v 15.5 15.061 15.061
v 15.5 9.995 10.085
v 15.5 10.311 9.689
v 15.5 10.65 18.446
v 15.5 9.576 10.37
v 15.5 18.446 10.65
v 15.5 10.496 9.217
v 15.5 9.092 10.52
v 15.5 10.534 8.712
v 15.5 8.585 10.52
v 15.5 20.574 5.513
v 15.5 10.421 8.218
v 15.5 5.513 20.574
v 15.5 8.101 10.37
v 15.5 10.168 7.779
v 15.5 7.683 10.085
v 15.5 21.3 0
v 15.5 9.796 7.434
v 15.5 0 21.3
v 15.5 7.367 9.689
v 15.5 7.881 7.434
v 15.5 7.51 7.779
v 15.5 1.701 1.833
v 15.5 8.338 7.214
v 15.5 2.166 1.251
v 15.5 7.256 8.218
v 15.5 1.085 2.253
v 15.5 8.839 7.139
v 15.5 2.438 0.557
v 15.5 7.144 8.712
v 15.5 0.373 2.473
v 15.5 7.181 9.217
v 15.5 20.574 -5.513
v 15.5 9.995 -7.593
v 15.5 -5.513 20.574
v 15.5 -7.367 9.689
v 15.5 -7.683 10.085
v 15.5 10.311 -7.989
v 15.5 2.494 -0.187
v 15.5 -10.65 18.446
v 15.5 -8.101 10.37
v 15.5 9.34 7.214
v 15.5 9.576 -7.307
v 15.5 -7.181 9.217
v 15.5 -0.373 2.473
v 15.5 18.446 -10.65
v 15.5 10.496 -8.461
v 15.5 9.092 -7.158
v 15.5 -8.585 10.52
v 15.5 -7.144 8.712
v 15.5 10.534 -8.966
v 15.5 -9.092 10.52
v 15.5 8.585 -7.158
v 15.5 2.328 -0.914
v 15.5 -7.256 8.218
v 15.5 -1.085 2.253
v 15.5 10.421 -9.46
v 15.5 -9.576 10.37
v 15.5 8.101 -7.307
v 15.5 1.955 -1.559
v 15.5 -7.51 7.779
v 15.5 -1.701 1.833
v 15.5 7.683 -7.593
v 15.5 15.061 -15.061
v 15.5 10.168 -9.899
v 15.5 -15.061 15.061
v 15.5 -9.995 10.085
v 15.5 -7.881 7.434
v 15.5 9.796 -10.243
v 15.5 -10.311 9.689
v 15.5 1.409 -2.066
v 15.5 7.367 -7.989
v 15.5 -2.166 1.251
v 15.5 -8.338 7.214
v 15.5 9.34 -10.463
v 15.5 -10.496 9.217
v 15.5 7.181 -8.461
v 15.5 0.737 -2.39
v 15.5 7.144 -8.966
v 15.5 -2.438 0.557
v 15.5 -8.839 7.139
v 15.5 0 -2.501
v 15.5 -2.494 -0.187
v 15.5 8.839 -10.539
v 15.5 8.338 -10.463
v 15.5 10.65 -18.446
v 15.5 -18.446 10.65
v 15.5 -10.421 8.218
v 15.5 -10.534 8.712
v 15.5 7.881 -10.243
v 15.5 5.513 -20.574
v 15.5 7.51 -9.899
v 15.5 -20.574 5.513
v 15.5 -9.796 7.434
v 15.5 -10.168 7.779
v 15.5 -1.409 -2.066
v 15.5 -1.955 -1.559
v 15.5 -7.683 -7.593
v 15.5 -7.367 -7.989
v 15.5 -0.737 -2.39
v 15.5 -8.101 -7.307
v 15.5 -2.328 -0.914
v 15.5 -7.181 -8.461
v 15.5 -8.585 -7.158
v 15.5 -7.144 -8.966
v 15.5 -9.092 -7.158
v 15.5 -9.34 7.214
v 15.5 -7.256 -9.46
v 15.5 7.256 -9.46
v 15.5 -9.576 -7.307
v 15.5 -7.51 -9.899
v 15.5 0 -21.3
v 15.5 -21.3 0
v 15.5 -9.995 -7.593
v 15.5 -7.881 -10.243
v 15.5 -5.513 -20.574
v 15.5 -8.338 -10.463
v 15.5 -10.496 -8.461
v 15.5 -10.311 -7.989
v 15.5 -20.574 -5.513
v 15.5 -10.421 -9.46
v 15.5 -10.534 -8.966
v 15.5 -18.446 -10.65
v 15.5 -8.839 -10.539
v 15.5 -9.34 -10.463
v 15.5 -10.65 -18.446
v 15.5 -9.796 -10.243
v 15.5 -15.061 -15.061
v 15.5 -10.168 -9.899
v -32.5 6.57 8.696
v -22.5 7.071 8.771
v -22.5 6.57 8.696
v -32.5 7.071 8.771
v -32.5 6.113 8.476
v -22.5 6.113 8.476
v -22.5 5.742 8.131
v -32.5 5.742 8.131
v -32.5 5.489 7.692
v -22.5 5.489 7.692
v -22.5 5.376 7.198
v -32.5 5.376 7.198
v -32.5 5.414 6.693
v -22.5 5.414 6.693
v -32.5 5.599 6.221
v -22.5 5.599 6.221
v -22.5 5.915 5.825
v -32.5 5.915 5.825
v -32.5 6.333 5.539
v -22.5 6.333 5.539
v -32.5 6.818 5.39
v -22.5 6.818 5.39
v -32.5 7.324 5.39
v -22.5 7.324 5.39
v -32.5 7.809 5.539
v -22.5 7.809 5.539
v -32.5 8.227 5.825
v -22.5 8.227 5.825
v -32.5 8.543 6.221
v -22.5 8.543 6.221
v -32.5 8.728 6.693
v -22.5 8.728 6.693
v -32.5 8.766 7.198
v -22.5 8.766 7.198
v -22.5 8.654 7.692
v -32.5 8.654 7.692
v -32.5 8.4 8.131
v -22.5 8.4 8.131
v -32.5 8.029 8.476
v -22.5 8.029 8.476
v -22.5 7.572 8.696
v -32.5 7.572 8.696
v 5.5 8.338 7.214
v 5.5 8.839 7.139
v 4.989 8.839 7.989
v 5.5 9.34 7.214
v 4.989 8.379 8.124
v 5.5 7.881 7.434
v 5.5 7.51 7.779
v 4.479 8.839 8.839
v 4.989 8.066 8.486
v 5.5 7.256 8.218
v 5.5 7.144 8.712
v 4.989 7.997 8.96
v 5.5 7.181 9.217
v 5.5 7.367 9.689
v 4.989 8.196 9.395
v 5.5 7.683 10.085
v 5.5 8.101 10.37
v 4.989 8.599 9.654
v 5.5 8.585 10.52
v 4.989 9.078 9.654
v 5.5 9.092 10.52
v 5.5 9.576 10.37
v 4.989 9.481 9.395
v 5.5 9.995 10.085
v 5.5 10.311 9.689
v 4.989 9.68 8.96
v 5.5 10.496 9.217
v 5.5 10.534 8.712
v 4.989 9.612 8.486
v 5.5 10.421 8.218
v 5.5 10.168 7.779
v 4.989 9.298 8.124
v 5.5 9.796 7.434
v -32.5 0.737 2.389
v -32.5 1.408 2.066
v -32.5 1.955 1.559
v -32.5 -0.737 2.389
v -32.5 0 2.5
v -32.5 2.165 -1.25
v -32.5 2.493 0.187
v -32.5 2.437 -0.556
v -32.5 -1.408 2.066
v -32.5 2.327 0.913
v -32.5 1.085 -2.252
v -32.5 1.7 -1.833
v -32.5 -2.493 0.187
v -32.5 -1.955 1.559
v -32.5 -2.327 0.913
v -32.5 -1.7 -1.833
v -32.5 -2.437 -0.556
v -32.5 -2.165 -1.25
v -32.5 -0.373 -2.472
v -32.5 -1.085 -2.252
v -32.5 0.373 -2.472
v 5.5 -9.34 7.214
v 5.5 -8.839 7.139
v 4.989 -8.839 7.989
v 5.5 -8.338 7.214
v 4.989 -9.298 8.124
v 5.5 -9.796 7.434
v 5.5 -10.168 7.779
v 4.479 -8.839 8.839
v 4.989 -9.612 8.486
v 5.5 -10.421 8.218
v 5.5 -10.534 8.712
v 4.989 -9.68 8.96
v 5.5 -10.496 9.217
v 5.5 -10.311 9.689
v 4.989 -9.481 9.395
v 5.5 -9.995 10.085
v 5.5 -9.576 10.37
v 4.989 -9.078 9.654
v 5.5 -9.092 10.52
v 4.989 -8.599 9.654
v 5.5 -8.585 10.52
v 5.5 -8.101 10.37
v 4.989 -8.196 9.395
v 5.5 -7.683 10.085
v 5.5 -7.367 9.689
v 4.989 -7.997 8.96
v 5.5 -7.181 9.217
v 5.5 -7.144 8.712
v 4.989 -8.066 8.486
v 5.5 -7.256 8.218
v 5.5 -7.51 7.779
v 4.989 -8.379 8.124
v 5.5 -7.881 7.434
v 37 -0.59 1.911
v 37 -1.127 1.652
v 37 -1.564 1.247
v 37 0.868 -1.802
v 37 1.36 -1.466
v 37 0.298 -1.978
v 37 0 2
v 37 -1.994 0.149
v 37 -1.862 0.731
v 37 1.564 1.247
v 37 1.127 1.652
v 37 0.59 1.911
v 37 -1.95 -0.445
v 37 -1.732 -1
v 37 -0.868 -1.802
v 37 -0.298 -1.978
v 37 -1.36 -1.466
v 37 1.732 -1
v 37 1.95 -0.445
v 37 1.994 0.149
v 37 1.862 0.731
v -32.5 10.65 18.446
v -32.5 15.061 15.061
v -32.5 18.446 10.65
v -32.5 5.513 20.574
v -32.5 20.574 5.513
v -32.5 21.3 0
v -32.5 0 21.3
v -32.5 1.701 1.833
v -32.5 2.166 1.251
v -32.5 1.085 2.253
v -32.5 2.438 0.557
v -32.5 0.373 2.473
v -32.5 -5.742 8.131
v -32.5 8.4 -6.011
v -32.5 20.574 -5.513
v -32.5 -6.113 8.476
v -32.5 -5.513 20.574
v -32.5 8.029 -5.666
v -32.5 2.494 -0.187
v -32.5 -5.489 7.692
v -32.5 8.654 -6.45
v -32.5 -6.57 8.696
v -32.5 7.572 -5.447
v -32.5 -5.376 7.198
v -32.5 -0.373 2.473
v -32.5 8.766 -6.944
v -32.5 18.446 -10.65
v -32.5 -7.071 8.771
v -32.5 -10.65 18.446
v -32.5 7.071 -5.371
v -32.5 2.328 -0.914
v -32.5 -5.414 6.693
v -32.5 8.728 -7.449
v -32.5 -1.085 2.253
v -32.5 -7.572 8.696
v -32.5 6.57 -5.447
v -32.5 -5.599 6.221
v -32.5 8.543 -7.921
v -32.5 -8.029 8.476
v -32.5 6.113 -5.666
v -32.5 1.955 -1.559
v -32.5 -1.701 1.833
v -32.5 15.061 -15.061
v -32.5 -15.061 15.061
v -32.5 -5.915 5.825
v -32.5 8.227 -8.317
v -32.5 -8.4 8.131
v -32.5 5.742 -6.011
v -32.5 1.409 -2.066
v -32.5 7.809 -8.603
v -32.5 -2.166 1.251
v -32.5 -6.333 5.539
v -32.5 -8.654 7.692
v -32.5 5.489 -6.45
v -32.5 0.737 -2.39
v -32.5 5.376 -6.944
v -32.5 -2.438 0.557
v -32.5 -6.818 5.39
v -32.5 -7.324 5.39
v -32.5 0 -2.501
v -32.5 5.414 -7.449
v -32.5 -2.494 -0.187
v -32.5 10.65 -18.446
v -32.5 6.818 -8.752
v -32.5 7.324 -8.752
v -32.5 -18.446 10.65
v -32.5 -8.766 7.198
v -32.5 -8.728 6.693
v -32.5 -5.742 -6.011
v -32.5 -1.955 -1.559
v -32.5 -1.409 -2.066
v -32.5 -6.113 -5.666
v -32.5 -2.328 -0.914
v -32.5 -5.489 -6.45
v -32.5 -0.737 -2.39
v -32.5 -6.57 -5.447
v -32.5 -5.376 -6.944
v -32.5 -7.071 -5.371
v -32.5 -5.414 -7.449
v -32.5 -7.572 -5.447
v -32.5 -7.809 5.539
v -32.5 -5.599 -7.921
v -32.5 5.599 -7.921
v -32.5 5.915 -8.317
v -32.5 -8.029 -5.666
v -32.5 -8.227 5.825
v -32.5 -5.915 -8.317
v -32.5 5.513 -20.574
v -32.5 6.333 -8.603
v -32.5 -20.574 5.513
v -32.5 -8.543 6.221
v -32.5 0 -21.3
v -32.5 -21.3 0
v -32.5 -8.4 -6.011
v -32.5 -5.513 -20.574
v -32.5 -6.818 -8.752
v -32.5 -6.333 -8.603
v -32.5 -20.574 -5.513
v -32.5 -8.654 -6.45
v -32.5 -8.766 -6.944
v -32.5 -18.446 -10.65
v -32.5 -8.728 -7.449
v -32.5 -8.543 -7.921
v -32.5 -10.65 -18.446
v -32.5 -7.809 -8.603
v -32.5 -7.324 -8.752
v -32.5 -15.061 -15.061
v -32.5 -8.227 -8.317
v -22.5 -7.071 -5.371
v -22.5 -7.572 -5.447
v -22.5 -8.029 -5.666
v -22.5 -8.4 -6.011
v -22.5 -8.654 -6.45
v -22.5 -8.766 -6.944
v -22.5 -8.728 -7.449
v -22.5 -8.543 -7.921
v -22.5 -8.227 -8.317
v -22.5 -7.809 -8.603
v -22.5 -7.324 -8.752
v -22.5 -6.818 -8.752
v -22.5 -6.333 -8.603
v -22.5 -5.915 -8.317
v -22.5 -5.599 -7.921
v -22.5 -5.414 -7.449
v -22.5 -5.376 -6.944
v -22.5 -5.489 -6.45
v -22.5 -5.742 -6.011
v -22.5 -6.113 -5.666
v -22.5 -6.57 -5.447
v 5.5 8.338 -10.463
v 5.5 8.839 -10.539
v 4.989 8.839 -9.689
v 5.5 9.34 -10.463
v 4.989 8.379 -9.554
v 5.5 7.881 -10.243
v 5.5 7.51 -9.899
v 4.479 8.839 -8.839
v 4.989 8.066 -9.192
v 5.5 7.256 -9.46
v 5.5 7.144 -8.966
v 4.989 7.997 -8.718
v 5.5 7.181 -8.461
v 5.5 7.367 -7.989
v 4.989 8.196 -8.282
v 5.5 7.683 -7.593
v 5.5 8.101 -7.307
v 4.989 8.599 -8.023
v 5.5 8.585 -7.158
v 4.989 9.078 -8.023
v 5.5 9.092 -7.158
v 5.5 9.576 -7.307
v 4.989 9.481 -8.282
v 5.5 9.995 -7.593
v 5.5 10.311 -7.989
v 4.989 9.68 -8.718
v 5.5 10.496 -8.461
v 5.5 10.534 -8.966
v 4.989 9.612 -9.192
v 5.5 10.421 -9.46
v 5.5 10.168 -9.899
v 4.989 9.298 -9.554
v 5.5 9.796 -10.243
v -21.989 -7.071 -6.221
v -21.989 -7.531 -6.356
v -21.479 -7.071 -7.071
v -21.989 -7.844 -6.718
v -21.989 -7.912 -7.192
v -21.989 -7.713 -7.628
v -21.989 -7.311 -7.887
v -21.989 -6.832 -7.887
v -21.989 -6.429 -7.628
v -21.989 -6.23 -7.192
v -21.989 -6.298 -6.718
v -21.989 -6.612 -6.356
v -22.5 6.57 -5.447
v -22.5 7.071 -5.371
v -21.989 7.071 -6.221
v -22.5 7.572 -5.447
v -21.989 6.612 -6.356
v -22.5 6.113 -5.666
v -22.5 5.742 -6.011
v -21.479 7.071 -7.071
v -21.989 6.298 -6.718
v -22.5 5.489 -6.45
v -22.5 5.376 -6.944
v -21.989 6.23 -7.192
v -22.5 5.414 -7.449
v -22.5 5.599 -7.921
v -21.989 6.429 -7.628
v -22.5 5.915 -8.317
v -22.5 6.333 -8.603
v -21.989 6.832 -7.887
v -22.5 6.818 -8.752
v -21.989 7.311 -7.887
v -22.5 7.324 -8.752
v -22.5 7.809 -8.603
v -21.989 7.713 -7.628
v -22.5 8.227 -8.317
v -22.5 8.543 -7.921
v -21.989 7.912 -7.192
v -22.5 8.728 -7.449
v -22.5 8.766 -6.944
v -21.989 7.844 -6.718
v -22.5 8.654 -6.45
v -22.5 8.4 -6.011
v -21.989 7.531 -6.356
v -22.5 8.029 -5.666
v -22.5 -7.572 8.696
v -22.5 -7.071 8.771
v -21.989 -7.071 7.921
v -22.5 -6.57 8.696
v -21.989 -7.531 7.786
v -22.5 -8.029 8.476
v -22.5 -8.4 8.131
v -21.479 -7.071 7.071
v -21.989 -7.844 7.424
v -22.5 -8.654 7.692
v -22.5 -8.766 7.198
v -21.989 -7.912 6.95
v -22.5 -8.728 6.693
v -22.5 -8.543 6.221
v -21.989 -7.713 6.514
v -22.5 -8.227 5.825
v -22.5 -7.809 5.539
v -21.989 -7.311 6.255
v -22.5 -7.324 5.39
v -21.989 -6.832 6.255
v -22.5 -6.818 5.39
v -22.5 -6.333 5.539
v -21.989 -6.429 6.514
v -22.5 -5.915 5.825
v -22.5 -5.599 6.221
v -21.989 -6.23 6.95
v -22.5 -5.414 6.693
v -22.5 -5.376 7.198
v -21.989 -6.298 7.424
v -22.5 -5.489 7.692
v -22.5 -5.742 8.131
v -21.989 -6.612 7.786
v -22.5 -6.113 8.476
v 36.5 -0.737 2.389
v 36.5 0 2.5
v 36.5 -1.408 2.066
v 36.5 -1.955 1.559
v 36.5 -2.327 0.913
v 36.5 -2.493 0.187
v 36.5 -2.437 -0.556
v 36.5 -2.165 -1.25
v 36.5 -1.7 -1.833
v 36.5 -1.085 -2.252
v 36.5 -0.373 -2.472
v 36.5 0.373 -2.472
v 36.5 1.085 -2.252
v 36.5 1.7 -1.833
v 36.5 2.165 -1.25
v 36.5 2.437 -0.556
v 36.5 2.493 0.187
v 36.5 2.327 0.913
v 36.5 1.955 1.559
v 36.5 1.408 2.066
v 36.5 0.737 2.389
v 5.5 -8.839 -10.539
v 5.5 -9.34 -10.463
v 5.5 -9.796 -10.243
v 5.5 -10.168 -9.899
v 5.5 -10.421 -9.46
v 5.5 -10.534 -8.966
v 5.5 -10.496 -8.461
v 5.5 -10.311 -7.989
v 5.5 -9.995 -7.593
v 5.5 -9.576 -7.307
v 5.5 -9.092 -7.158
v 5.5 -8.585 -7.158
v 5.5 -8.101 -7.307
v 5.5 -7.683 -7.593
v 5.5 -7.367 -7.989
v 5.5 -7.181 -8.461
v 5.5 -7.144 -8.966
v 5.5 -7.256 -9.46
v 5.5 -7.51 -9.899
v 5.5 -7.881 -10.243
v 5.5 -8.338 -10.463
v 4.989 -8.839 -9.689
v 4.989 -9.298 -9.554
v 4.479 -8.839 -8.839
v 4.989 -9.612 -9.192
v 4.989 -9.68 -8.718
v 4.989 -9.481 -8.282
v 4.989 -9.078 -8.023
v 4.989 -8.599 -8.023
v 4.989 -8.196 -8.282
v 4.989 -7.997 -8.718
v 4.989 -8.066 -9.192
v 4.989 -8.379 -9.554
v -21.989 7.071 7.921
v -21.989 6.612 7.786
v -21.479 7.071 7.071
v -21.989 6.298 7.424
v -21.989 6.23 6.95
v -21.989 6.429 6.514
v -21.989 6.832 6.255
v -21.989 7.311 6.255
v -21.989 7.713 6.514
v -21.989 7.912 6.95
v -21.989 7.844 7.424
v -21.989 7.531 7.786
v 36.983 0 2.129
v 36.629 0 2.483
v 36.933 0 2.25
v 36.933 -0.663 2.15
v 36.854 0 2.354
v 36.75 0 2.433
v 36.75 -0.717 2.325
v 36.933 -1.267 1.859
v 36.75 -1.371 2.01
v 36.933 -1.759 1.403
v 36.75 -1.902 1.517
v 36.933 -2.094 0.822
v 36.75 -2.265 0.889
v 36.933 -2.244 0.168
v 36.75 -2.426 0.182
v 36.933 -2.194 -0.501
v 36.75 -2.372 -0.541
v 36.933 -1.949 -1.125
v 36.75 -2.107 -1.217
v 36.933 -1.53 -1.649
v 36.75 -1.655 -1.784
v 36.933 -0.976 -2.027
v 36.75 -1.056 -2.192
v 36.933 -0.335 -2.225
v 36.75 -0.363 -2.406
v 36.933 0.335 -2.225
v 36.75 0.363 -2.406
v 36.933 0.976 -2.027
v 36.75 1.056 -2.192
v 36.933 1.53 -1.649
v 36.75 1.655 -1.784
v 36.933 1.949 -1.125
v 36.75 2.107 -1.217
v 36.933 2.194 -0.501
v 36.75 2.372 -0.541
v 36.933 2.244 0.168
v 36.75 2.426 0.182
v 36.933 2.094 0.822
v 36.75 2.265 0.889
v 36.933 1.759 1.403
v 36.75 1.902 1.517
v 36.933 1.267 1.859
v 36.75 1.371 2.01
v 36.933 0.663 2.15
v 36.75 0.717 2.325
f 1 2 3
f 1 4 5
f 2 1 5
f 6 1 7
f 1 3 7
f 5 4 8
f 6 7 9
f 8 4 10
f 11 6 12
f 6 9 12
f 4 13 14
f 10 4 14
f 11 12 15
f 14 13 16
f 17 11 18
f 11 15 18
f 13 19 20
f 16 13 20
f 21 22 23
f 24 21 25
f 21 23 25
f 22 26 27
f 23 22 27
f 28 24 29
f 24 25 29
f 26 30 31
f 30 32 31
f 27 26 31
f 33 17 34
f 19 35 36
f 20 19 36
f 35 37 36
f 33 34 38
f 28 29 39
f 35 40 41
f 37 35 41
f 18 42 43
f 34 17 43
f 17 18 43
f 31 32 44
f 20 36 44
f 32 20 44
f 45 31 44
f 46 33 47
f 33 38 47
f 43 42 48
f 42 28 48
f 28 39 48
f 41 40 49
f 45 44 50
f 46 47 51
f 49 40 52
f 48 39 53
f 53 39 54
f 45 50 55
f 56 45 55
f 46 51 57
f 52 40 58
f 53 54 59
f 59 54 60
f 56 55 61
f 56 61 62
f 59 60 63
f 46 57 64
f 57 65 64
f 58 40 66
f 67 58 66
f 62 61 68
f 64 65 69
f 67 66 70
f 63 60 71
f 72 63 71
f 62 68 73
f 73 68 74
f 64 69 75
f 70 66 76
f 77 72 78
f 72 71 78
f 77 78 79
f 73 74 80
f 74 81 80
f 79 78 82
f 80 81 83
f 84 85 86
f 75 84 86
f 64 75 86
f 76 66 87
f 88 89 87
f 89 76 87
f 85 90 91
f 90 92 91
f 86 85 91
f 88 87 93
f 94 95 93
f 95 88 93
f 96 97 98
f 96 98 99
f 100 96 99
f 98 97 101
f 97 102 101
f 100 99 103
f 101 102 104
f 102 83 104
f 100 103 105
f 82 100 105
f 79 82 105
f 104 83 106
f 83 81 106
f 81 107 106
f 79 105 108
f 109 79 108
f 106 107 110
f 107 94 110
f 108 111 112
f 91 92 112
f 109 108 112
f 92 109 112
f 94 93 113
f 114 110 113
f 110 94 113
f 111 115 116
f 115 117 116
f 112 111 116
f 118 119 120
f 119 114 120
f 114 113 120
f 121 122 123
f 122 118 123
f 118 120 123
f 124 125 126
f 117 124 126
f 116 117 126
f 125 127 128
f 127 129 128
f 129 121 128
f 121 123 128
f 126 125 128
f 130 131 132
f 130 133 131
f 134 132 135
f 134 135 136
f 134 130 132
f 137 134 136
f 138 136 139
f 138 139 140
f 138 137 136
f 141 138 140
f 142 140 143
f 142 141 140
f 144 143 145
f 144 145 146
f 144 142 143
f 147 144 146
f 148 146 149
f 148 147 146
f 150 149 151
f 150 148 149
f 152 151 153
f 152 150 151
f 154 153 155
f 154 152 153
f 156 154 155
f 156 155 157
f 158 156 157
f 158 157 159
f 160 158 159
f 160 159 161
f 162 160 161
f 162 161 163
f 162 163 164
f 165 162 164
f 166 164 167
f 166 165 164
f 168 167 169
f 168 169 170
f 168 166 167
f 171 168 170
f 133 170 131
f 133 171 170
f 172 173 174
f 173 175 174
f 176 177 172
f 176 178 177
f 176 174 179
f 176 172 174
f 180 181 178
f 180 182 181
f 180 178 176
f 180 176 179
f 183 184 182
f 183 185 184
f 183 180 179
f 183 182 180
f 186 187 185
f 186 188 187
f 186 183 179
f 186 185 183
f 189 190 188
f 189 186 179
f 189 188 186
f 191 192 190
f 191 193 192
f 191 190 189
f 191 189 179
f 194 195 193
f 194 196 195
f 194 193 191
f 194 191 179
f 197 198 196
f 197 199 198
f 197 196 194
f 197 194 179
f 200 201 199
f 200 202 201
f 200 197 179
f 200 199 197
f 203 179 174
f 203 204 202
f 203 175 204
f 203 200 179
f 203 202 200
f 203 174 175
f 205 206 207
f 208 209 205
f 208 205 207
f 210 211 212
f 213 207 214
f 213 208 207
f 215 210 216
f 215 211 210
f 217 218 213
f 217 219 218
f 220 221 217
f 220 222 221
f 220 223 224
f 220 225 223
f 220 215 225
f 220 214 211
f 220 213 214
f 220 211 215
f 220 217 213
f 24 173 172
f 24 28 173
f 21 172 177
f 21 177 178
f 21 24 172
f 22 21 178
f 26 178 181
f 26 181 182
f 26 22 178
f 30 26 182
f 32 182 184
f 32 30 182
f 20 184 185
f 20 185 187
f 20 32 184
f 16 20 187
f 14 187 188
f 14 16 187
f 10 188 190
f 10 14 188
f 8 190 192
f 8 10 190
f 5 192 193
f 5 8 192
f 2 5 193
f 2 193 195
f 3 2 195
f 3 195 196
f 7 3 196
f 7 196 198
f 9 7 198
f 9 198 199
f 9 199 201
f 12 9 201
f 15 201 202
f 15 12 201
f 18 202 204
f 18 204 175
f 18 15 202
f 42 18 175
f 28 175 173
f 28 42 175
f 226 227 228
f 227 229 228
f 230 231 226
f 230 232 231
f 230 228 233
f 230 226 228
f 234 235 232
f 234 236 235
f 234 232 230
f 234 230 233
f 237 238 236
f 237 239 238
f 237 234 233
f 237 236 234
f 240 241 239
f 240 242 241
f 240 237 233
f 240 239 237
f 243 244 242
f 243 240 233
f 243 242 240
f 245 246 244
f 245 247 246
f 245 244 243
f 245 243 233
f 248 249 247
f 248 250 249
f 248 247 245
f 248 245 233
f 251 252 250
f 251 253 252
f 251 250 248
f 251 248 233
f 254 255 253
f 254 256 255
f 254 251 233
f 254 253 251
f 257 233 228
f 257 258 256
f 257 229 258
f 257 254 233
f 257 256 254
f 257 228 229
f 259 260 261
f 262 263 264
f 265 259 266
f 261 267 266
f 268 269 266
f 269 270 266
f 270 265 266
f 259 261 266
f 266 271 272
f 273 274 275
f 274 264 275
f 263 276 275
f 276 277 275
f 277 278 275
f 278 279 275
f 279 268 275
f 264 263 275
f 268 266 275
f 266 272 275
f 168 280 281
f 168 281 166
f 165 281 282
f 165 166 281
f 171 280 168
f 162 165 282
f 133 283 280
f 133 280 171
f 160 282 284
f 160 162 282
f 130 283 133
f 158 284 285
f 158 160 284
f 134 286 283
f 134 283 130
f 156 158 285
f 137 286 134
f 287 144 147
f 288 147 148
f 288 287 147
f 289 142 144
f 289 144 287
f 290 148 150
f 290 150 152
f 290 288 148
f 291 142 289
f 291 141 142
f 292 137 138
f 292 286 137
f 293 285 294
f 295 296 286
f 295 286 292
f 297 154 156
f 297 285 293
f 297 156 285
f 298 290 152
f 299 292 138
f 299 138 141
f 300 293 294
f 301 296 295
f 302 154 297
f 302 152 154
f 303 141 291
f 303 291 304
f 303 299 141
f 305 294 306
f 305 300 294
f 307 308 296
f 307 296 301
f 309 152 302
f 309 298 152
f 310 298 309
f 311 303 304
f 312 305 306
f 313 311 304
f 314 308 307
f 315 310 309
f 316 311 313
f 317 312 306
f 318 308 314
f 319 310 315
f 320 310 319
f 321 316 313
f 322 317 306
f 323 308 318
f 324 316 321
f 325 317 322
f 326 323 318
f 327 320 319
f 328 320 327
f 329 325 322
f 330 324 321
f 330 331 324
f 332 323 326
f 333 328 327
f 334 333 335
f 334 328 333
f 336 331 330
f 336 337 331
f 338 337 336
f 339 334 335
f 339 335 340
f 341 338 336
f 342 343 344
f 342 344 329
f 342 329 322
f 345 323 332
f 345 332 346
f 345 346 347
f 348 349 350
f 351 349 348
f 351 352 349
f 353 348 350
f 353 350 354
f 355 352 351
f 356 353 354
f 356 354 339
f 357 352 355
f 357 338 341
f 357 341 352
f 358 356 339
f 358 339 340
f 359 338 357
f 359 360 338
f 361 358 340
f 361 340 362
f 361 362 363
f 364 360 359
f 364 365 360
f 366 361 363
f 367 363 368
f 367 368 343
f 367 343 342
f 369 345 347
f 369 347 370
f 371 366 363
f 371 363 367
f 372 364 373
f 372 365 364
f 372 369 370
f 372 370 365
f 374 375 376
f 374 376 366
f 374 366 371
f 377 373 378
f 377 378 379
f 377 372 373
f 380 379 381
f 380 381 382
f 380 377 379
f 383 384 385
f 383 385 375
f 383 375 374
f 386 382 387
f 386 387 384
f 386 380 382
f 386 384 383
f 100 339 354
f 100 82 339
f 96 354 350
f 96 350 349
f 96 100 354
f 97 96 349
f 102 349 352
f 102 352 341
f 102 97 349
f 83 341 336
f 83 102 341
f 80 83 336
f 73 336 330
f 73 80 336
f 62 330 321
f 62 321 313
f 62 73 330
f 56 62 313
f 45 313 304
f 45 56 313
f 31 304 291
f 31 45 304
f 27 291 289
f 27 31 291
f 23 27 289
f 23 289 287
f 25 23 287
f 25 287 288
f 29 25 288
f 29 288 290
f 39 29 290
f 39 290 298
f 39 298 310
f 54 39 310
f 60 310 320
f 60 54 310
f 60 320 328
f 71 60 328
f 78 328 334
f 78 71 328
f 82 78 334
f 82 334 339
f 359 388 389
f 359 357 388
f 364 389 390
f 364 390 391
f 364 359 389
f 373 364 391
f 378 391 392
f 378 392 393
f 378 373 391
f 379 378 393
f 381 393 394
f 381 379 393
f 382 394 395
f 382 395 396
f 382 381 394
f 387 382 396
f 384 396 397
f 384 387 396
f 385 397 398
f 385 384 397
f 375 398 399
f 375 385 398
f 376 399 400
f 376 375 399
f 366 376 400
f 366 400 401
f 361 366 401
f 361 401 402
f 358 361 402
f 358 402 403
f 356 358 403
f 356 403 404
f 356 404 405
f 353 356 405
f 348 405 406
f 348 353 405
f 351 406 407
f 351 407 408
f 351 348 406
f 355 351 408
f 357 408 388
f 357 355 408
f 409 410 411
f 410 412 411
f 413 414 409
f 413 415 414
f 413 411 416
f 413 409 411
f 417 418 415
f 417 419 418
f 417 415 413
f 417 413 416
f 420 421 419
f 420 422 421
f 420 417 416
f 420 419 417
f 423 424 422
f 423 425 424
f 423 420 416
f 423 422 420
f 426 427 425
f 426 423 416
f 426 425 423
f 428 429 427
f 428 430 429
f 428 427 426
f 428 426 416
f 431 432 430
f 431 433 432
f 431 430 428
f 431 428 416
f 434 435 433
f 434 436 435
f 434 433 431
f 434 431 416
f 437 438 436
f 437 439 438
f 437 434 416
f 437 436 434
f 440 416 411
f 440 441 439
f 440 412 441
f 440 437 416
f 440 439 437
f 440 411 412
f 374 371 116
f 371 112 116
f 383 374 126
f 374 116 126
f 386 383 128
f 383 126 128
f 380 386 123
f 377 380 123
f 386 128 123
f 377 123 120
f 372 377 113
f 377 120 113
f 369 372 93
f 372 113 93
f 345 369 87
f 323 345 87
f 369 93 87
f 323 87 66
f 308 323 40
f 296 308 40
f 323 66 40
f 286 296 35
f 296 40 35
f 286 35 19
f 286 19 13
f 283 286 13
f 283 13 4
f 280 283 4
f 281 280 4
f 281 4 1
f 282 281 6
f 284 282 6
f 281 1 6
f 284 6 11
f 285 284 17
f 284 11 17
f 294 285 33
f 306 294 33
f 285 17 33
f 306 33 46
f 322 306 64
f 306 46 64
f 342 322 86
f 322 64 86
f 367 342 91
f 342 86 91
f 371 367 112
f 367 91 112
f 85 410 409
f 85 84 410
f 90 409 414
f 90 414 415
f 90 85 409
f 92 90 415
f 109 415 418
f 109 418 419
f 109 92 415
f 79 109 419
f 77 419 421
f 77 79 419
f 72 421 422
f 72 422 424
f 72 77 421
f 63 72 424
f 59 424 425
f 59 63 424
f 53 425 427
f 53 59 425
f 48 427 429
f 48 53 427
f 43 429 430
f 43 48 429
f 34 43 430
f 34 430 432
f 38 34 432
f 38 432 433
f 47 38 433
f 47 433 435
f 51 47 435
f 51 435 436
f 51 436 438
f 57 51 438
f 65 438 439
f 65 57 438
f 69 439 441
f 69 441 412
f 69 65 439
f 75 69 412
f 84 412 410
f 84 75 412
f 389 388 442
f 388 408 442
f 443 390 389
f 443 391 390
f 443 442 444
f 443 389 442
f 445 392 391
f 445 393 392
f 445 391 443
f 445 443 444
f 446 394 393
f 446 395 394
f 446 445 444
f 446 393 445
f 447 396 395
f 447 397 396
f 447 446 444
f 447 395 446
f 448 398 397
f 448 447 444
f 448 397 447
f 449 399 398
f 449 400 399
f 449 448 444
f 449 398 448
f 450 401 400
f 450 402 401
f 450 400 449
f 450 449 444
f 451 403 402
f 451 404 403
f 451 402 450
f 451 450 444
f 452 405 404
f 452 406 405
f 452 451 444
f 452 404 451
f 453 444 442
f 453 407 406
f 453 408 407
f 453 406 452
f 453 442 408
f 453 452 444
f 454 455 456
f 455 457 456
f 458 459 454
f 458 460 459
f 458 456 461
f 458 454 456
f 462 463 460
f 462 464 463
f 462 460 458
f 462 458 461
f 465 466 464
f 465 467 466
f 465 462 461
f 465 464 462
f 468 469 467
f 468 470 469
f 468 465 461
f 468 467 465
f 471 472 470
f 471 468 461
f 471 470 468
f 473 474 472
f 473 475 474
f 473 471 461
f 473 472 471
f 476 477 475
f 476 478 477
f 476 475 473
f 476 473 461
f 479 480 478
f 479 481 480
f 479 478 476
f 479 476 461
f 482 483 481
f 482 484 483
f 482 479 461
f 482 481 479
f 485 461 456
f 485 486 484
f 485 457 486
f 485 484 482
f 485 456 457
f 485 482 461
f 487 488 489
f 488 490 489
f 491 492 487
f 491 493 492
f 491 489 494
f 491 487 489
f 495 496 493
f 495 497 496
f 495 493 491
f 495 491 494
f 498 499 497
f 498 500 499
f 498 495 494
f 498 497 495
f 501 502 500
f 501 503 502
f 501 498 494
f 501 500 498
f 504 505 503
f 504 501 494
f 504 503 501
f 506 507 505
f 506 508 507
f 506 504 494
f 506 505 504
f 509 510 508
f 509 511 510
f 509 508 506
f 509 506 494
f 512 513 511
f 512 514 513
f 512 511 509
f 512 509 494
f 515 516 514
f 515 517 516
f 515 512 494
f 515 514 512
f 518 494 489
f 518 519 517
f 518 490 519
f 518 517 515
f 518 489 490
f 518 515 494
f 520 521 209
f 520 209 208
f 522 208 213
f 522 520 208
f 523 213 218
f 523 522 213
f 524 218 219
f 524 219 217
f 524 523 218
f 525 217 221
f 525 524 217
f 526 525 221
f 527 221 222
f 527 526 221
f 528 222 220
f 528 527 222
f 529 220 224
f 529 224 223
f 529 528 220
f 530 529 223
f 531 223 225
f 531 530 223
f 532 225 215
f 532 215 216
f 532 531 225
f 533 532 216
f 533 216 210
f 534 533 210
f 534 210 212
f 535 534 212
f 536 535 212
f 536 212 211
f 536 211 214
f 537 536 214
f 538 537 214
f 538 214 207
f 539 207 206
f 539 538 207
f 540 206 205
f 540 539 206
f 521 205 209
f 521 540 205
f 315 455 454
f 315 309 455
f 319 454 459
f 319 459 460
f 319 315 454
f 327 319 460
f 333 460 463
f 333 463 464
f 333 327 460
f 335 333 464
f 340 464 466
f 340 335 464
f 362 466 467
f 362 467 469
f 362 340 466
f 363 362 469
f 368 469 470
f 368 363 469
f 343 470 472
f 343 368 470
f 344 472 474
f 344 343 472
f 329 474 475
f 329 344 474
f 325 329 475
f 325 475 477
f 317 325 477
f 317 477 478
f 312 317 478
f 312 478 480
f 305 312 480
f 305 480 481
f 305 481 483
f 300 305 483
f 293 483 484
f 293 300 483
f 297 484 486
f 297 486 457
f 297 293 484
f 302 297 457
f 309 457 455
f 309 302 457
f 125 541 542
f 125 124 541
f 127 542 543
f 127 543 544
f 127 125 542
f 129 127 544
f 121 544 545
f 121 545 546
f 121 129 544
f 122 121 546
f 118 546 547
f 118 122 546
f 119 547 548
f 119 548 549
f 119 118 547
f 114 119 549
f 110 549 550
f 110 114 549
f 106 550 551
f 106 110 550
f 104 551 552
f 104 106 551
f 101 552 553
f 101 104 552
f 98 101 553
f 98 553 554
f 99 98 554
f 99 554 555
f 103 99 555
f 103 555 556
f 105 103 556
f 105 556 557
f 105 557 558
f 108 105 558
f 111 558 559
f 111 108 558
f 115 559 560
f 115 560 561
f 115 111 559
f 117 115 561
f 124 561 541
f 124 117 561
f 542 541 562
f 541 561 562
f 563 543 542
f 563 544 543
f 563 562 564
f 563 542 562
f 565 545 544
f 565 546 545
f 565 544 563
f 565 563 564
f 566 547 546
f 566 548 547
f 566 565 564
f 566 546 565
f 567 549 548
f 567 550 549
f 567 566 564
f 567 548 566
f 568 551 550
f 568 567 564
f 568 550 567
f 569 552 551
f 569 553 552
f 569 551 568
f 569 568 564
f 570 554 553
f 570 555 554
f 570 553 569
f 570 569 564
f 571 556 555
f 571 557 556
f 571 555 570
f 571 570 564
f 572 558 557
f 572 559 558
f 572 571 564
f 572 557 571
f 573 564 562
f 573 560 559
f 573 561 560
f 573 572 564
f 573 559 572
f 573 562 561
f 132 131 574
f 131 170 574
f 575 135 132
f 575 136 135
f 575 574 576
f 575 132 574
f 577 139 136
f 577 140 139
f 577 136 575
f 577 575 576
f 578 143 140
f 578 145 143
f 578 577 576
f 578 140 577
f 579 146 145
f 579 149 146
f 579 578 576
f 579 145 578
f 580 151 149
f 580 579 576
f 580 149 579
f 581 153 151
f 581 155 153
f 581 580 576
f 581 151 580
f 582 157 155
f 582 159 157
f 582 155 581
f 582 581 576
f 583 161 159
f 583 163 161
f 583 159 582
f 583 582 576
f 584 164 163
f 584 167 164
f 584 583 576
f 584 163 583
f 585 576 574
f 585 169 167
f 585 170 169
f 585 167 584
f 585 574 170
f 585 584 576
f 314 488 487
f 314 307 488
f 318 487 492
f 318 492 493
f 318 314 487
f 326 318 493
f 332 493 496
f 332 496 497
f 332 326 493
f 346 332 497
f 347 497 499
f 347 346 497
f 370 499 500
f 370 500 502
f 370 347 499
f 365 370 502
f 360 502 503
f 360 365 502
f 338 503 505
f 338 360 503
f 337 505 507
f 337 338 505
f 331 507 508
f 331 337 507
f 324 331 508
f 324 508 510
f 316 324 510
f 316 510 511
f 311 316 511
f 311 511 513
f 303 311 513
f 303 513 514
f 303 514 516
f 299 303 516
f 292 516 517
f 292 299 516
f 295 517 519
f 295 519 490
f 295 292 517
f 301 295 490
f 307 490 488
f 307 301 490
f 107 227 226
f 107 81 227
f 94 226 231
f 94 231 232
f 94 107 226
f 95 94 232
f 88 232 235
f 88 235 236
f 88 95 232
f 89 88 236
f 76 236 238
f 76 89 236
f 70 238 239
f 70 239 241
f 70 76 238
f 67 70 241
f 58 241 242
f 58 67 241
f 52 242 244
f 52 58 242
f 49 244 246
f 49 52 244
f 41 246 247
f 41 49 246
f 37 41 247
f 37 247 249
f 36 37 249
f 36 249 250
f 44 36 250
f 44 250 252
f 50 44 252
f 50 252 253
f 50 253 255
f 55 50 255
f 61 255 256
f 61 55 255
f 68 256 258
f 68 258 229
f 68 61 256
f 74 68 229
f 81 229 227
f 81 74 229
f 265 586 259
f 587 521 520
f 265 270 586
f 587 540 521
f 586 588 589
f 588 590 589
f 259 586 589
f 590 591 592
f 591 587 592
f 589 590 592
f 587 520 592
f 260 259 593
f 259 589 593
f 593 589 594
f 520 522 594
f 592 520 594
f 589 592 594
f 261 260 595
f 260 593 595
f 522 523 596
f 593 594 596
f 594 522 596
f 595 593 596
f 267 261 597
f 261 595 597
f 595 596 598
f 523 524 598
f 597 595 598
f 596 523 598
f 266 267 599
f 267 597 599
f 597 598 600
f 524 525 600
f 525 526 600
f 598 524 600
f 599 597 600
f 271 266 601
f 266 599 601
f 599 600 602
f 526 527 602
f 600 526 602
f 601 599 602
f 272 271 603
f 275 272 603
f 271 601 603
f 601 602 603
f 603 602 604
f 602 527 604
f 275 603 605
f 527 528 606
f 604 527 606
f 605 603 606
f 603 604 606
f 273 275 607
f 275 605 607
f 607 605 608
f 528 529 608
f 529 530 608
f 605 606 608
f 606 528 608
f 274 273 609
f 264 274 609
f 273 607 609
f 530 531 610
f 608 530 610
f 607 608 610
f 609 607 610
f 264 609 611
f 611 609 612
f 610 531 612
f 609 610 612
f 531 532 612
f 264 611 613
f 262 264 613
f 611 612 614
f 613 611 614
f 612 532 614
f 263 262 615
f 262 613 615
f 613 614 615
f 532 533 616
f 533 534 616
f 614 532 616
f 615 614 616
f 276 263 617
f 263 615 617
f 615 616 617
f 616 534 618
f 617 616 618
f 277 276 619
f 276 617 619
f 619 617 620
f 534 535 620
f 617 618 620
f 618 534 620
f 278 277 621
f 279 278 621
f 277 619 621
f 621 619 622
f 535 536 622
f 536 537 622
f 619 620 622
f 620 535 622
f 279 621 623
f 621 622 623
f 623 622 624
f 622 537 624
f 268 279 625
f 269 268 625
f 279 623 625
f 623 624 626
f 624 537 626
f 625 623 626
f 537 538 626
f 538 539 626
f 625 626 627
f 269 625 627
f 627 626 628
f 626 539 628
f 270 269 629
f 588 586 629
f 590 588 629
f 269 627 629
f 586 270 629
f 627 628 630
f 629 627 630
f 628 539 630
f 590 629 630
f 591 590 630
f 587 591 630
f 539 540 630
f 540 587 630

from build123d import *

# Parameters (mm, degrees)
ESBO_O1_W                        = 69.5
ESBO_O1_H                        = 2.5
FILETE1_R                        = 0.5
ESBO_O10_W                       = 48
ESBO_O10_H                       = 18.799
FURO_COM_FOLGA_DE_M32_AT_2_COUNT = 2
FURO_COM_FOLGA_DE_M32_AT_2_PITCH = 17.67766953
FURO_COM_FOLGA_DE_M32_AT_3_COUNT = 2
FURO_COM_FOLGA_DE_M32_AT_3_PITCH = 25
FURO_COM_FOLGA_DE_M32_AT_4_COUNT = 2
FURO_COM_FOLGA_DE_M32_AT_4_PITCH = 17.67766953
FURO_COM_FOLGA_DE_M33_AT_2_COUNT = 2
FURO_COM_FOLGA_DE_M33_AT_2_PITCH = 14.142135624
FURO_COM_FOLGA_DE_M33_AT_3_COUNT = 2
FURO_COM_FOLGA_DE_M33_AT_3_PITCH = 20
FURO_COM_FOLGA_DE_M33_AT_4_COUNT = 2
FURO_COM_FOLGA_DE_M33_AT_4_PITCH = 14.142135624


with BuildPart() as part:
    # Esboço1 → Revolução2 (revolve)
    with BuildSketch(Plane.XY, mode=Mode.PRIVATE) as revolu_o2_sk:
        with Locations((2.25, 1.25)):
            Rectangle(ESBO_O1_W, ESBO_O1_H)
    revolve(revolu_o2_sk.sketch.rotate(Axis((-36.840109943, 0, 0), (1, 0, 0)), 90), axis=Axis((-36.840109943, 0, 0), (1, 0, 0)))

    # Filete1
    filete1_edges = [part.edges().sort_by_distance(p)[0] for p in [
        (37, 0, -2.5),
    ]]
    fillet(filete1_edges, radius=FILETE1_R)


with BuildPart() as body_2:
    # Esboço10 → Revolução3 (revolve)
    with BuildSketch(Plane(origin=(0, 0, 0), x_dir=(1, 0, 0), z_dir=(0, 1, 0)), mode=Mode.PRIVATE) as revolu_o3_sk:
        with Locations((-8.5, -11.9005)):
            Rectangle(ESBO_O10_W, ESBO_O10_H)
    revolve(revolu_o3_sk.sketch.rotate(Axis((36.5, 0, 0), (-1, 0, 0)), 180), axis=Axis((36.5, 0, 0), (-1, 0, 0)))

    # Esboço12 → Furo com folga de M32 (revolve, cut)
    with BuildSketch(Plane(origin=(15.5, 8.838834765, 8.838834765), x_dir=(0, 0, -1), z_dir=(0, 1, 0))):
        Polygon((0, 0), (0, 11.021463052), (1.7, 10), (1.7, 0), align=None)
    furo_com_folga_de_m32 = revolve(axis=Axis((21.85, 8.838834765, 8.838834765), (-1, 0, 0)), mode=Mode.SUBTRACT)

    # Furo com folga de M32 at 2: Furo com folga de M32 ×2
    with Locations(*[(0, 0, -i * FURO_COM_FOLGA_DE_M32_AT_2_PITCH) for i in range(1, FURO_COM_FOLGA_DE_M32_AT_2_COUNT)]):
        add(furo_com_folga_de_m32, mode=Mode.SUBTRACT)

    # Furo com folga de M32 at 3: Furo com folga de M32 ×2
    with Locations(*[Vector(0, -0.7071067811865437, -0.7071067811865515) * (i * FURO_COM_FOLGA_DE_M32_AT_3_PITCH) for i in range(1, FURO_COM_FOLGA_DE_M32_AT_3_COUNT)]):
        add(furo_com_folga_de_m32, mode=Mode.SUBTRACT)

    # Furo com folga de M32 at 4: Furo com folga de M32 ×2
    with Locations(*[(0, -i * FURO_COM_FOLGA_DE_M32_AT_4_PITCH, 0) for i in range(1, FURO_COM_FOLGA_DE_M32_AT_4_COUNT)]):
        add(furo_com_folga_de_m32, mode=Mode.SUBTRACT)

    # Esboço15 → Furo com folga de M33 (revolve, cut)
    with BuildSketch(Plane(origin=(-32.5, 7.071067812, -7.071067812), x_dir=(0, 0, 1), z_dir=(0, 1, 0))):
        Polygon((0, 0), (0, 11.021463052), (1.7, 10), (1.7, 0), align=None)
    furo_com_folga_de_m33 = revolve(axis=Axis((-38.85, 7.071067812, -7.071067812), (1, 0, 0)), mode=Mode.SUBTRACT)

    # Furo com folga de M33 at 2: Furo com folga de M33 ×2
    with Locations(*[(0, -i * FURO_COM_FOLGA_DE_M33_AT_2_PITCH, 0) for i in range(1, FURO_COM_FOLGA_DE_M33_AT_2_COUNT)]):
        add(furo_com_folga_de_m33, mode=Mode.SUBTRACT)

    # Furo com folga de M33 at 3: Furo com folga de M33 ×2
    with Locations(*[Vector(0, -0.7071067811865432, 0.7071067811865519) * (i * FURO_COM_FOLGA_DE_M33_AT_3_PITCH) for i in range(1, FURO_COM_FOLGA_DE_M33_AT_3_COUNT)]):
        add(furo_com_folga_de_m33, mode=Mode.SUBTRACT)

    # Furo com folga de M33 at 4: Furo com folga de M33 ×2
    with Locations(*[(0, 0, i * FURO_COM_FOLGA_DE_M33_AT_4_PITCH) for i in range(1, FURO_COM_FOLGA_DE_M33_AT_4_COUNT)]):
        add(furo_com_folga_de_m33, mode=Mode.SUBTRACT)


solid = Compound([part.part, body_2.part])
